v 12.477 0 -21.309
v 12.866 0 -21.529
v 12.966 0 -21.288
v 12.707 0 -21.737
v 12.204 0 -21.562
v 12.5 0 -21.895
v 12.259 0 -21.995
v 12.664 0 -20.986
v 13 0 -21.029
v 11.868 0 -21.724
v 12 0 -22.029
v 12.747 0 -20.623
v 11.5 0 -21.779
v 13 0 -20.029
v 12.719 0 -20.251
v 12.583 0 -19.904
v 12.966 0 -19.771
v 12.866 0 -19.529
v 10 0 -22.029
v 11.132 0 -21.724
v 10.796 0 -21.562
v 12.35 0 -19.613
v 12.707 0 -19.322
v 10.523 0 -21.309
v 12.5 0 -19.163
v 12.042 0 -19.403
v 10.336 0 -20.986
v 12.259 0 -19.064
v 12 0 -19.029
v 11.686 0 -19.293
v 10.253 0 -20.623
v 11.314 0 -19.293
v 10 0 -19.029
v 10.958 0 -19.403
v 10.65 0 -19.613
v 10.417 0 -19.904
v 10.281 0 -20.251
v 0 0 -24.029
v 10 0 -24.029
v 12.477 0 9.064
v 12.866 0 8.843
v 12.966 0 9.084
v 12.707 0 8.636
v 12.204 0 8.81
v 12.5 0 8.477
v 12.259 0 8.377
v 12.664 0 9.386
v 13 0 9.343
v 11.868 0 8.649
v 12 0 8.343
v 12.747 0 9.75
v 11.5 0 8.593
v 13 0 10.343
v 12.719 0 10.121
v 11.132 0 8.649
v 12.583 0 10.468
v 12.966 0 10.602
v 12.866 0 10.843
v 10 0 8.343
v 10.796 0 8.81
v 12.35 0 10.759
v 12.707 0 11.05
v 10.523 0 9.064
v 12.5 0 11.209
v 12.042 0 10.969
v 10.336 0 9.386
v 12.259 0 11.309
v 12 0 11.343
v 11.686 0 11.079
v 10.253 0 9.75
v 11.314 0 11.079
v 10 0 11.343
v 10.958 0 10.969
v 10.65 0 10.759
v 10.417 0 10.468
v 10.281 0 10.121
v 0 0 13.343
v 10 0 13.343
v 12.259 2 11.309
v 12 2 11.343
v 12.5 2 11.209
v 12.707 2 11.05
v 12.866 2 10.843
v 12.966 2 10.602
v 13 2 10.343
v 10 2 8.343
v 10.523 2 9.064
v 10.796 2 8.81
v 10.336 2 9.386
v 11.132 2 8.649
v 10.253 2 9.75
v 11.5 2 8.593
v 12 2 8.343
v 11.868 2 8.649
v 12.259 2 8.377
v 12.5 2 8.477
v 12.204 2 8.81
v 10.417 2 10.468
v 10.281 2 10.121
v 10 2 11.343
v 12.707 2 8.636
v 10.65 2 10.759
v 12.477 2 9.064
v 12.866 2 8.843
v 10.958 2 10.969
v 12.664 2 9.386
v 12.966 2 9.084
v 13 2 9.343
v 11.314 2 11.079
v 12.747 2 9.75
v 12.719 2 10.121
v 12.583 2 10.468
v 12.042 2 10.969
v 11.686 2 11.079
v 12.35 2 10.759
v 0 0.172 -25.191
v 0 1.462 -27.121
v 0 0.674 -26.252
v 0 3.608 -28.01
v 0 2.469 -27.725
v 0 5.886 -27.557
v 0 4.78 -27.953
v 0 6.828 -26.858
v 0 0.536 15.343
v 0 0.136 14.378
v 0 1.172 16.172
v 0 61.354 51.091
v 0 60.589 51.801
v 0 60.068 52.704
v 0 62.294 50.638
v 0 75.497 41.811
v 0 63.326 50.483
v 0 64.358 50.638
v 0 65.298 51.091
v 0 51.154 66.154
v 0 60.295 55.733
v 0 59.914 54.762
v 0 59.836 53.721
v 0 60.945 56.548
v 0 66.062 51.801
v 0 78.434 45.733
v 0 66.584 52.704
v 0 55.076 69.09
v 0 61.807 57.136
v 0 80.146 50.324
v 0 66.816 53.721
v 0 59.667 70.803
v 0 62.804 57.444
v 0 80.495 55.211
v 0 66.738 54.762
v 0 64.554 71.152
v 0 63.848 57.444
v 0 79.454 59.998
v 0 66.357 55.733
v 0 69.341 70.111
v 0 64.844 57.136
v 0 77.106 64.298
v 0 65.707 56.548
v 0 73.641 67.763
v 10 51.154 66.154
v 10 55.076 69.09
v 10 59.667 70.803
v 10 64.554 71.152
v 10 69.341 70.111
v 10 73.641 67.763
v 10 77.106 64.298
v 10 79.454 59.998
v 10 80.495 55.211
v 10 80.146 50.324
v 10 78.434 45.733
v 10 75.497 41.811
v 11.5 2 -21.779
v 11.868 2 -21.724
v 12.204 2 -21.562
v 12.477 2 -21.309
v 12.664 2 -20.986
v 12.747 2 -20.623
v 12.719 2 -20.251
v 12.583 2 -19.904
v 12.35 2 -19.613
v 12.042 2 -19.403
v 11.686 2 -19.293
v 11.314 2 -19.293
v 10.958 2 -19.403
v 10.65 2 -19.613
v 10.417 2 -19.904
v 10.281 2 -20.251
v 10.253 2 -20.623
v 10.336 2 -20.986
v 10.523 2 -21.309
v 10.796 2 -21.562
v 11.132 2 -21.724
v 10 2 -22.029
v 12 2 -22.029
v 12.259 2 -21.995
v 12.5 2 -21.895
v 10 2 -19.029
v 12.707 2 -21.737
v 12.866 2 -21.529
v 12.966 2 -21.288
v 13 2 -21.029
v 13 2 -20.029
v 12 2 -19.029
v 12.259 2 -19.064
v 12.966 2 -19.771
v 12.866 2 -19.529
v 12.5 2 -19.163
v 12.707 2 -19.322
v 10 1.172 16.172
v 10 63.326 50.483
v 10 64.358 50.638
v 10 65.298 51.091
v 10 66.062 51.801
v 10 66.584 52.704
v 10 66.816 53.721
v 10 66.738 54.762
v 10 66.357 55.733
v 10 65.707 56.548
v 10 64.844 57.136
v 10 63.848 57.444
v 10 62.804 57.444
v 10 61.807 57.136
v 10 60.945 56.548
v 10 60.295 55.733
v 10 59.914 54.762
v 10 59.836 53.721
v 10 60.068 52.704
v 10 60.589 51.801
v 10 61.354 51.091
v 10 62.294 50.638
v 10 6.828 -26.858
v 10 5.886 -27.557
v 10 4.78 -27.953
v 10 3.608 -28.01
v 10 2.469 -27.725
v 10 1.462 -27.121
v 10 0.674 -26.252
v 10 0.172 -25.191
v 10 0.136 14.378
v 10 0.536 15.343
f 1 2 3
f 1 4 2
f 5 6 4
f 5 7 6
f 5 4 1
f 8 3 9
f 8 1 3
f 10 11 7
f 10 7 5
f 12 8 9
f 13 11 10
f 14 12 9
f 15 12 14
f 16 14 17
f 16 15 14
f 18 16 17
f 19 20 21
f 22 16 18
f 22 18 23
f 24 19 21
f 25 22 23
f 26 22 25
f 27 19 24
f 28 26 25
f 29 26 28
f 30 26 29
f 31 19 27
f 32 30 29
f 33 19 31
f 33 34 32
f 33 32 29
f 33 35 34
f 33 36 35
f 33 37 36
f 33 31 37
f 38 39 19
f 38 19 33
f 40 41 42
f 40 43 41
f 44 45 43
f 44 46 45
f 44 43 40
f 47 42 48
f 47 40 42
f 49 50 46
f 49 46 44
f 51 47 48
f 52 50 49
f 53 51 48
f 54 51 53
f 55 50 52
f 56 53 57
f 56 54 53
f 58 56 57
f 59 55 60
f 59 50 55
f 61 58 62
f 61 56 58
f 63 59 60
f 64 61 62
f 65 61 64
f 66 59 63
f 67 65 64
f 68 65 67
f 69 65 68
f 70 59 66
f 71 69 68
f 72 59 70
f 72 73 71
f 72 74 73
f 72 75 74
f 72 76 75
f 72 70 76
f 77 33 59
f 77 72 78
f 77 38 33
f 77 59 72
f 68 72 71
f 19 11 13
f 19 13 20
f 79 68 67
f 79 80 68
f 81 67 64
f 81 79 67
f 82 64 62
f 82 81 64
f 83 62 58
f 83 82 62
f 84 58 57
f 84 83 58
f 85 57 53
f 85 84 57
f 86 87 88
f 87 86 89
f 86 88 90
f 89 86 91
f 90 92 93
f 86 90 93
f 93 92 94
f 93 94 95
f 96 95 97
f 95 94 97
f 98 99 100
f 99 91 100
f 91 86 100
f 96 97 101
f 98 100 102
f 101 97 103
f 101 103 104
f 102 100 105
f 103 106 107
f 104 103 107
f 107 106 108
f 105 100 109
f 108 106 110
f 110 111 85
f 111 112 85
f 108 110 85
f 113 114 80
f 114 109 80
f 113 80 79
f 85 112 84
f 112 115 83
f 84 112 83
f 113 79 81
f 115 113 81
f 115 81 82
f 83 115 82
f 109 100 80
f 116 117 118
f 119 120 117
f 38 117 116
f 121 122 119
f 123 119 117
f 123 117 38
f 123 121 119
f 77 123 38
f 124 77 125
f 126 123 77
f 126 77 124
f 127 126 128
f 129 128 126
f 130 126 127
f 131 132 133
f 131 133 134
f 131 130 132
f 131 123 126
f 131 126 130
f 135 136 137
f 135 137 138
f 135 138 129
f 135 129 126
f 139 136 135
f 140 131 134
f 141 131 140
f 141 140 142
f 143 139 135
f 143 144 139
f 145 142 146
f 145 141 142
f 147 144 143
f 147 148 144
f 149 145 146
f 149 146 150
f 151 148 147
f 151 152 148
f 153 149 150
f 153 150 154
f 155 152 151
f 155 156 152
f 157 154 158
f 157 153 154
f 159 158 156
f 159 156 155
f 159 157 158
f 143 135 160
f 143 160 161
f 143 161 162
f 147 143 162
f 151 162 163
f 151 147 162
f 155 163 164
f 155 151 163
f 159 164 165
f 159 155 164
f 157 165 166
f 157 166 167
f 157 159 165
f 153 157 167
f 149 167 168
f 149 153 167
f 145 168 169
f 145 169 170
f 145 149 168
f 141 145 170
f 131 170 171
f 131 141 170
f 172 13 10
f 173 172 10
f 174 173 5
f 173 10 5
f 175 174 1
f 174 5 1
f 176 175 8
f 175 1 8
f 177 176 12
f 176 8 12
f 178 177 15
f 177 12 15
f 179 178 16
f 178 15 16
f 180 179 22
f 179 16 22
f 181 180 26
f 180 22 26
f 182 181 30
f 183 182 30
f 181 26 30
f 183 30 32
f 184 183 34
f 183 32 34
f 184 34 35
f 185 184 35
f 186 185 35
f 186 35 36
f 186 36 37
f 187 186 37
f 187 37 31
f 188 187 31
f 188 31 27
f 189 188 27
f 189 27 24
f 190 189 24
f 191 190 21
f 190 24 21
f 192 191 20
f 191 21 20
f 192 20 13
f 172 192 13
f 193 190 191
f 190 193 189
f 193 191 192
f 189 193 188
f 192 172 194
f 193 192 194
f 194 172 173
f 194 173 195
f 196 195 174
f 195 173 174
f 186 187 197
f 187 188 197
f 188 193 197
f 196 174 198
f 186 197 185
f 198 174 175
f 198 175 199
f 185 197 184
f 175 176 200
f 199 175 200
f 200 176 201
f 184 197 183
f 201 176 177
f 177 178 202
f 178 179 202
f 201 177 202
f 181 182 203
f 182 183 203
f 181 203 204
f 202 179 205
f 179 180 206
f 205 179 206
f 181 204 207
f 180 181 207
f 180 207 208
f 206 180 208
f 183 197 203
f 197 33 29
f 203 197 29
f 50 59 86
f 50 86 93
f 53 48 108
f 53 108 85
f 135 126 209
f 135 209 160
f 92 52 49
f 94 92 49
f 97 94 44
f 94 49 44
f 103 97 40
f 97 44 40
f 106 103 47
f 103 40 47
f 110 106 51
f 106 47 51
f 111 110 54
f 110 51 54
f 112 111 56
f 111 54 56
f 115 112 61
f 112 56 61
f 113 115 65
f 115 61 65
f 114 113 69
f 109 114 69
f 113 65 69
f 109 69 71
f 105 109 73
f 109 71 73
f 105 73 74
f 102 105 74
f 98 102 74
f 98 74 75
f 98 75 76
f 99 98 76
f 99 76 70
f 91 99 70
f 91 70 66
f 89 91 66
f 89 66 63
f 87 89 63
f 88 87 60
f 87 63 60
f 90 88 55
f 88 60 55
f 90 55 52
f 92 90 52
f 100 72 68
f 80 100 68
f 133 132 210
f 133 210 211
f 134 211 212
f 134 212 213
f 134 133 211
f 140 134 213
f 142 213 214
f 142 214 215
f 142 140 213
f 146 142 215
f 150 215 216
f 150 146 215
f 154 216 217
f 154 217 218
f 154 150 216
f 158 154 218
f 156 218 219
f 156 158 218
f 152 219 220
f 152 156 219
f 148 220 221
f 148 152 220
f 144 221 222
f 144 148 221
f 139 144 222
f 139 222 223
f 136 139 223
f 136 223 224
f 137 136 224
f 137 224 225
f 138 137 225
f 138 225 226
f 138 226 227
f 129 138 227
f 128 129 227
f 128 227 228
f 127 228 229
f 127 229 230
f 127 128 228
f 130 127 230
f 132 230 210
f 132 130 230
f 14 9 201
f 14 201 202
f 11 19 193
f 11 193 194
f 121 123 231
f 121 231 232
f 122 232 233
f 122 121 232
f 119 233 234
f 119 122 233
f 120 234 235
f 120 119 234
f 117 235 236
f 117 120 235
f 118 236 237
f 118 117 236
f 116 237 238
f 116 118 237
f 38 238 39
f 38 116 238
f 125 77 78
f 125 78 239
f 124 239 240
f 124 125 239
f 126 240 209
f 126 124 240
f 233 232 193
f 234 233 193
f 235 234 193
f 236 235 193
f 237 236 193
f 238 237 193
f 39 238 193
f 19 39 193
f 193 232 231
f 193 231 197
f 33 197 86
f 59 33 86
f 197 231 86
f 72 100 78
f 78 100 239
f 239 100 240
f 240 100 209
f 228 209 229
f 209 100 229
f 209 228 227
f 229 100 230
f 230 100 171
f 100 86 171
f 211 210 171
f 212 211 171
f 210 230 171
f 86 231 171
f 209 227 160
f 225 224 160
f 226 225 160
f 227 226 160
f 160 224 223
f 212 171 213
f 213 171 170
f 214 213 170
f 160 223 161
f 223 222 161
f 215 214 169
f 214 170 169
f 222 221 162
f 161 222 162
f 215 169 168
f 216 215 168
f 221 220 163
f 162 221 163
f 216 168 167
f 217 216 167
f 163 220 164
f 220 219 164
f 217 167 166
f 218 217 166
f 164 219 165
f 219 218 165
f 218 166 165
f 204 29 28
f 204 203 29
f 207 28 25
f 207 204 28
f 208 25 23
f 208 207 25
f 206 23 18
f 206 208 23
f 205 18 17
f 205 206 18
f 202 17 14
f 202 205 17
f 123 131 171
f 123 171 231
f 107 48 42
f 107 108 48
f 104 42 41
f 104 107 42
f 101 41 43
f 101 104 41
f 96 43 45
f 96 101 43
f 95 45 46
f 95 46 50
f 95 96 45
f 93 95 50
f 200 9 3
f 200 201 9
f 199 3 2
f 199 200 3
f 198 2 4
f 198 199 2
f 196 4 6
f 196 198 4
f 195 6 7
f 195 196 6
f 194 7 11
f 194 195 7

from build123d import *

# Parameters (mm, degrees)
SKETCH1_R           = 3.5
BOSS_EXTRUDE2_DEPTH = 10
SKETCH2_W           = 3
SKETCH2_H           = 3
SKETCH2_R           = 1.25
BOSS_EXTRUDE3_DEPTH = 2
FILLET2_R           = 1
FILLET6_R           = 1
FILLET7_R           = 1


with BuildPart() as part:
    # Sketch1 → Boss-Extrude2 (new body)
    with BuildSketch(Plane(origin=(0, 0, 0), x_dir=(0, 0, -1), z_dir=(1, 0, 0))):
        with BuildLine():
            Line((0, 0), (-13.343145751, 0))
            ThreePointArc((-13.343145751, 0), (-14.87387948, 0.30448187), (-16.171572875, 1.171572875))
            Line((-16.171572875, 1.171572875), (-66.154328925, 51.154328925))
            ThreePointArc((-66.154328925, 51.154328925), (-66.154328925, 75.497474674), (-41.811183175, 75.497474674))
            Line((-41.811183175, 75.497474674), (26.857864374, 6.828427125))
            ThreePointArc((26.857864374, 6.828427125), (27.72495538, 2.469266271), (24.029437249, 0))
            Line((24.029437249, 0), (0, 0))
        make_face()
        with Locations((-53.98275605, 63.3259018)):
            Circle(SKETCH1_R, mode=Mode.SUBTRACT)
    extrude(amount=BOSS_EXTRUDE2_DEPTH)

    # Sketch2 → Boss-Extrude3 (add)
    # profile 1 of 2: a face of its own
    with BuildSketch(Plane.XZ):
        with Locations((11.5, 9.843145751)):
            Rectangle(SKETCH2_W, SKETCH2_H)
        with Locations(Location((11.5, 9.843145751, 0), (0, 0, 270))):
            Circle(SKETCH2_R, mode=Mode.SUBTRACT)
    # profile 2 of 2: a face of its own
    with BuildSketch(Plane.XZ):
        with Locations((11.5, -20.529437249)):
            Rectangle(SKETCH2_W, SKETCH2_H)
        with Locations(Location((11.5, -20.529437249, 0), (0, 0, 270))):
            Circle(SKETCH2_R, mode=Mode.SUBTRACT)
    extrude(amount=-BOSS_EXTRUDE3_DEPTH)

    # Fillet2
    fillet2_edges = [part.edges().sort_by_distance(p)[0] for p in [
        (13, 1, 11.343145751),
    ]]
    fillet(fillet2_edges, radius=FILLET2_R)

    # Fillet6
    fillet6_edges = [part.edges().sort_by_distance(p)[0] for p in [
        (13, 1, 8.343145751),
    ]]
    fillet(fillet6_edges, radius=FILLET6_R)

    # Fillet7
    fillet7_edges = [part.edges().sort_by_distance(p)[0] for p in [
        (13, 1, -19.029437249),
        (13, 1, -22.029437249),
    ]]
    fillet(fillet7_edges, radius=FILLET7_R)


solid = part.part
